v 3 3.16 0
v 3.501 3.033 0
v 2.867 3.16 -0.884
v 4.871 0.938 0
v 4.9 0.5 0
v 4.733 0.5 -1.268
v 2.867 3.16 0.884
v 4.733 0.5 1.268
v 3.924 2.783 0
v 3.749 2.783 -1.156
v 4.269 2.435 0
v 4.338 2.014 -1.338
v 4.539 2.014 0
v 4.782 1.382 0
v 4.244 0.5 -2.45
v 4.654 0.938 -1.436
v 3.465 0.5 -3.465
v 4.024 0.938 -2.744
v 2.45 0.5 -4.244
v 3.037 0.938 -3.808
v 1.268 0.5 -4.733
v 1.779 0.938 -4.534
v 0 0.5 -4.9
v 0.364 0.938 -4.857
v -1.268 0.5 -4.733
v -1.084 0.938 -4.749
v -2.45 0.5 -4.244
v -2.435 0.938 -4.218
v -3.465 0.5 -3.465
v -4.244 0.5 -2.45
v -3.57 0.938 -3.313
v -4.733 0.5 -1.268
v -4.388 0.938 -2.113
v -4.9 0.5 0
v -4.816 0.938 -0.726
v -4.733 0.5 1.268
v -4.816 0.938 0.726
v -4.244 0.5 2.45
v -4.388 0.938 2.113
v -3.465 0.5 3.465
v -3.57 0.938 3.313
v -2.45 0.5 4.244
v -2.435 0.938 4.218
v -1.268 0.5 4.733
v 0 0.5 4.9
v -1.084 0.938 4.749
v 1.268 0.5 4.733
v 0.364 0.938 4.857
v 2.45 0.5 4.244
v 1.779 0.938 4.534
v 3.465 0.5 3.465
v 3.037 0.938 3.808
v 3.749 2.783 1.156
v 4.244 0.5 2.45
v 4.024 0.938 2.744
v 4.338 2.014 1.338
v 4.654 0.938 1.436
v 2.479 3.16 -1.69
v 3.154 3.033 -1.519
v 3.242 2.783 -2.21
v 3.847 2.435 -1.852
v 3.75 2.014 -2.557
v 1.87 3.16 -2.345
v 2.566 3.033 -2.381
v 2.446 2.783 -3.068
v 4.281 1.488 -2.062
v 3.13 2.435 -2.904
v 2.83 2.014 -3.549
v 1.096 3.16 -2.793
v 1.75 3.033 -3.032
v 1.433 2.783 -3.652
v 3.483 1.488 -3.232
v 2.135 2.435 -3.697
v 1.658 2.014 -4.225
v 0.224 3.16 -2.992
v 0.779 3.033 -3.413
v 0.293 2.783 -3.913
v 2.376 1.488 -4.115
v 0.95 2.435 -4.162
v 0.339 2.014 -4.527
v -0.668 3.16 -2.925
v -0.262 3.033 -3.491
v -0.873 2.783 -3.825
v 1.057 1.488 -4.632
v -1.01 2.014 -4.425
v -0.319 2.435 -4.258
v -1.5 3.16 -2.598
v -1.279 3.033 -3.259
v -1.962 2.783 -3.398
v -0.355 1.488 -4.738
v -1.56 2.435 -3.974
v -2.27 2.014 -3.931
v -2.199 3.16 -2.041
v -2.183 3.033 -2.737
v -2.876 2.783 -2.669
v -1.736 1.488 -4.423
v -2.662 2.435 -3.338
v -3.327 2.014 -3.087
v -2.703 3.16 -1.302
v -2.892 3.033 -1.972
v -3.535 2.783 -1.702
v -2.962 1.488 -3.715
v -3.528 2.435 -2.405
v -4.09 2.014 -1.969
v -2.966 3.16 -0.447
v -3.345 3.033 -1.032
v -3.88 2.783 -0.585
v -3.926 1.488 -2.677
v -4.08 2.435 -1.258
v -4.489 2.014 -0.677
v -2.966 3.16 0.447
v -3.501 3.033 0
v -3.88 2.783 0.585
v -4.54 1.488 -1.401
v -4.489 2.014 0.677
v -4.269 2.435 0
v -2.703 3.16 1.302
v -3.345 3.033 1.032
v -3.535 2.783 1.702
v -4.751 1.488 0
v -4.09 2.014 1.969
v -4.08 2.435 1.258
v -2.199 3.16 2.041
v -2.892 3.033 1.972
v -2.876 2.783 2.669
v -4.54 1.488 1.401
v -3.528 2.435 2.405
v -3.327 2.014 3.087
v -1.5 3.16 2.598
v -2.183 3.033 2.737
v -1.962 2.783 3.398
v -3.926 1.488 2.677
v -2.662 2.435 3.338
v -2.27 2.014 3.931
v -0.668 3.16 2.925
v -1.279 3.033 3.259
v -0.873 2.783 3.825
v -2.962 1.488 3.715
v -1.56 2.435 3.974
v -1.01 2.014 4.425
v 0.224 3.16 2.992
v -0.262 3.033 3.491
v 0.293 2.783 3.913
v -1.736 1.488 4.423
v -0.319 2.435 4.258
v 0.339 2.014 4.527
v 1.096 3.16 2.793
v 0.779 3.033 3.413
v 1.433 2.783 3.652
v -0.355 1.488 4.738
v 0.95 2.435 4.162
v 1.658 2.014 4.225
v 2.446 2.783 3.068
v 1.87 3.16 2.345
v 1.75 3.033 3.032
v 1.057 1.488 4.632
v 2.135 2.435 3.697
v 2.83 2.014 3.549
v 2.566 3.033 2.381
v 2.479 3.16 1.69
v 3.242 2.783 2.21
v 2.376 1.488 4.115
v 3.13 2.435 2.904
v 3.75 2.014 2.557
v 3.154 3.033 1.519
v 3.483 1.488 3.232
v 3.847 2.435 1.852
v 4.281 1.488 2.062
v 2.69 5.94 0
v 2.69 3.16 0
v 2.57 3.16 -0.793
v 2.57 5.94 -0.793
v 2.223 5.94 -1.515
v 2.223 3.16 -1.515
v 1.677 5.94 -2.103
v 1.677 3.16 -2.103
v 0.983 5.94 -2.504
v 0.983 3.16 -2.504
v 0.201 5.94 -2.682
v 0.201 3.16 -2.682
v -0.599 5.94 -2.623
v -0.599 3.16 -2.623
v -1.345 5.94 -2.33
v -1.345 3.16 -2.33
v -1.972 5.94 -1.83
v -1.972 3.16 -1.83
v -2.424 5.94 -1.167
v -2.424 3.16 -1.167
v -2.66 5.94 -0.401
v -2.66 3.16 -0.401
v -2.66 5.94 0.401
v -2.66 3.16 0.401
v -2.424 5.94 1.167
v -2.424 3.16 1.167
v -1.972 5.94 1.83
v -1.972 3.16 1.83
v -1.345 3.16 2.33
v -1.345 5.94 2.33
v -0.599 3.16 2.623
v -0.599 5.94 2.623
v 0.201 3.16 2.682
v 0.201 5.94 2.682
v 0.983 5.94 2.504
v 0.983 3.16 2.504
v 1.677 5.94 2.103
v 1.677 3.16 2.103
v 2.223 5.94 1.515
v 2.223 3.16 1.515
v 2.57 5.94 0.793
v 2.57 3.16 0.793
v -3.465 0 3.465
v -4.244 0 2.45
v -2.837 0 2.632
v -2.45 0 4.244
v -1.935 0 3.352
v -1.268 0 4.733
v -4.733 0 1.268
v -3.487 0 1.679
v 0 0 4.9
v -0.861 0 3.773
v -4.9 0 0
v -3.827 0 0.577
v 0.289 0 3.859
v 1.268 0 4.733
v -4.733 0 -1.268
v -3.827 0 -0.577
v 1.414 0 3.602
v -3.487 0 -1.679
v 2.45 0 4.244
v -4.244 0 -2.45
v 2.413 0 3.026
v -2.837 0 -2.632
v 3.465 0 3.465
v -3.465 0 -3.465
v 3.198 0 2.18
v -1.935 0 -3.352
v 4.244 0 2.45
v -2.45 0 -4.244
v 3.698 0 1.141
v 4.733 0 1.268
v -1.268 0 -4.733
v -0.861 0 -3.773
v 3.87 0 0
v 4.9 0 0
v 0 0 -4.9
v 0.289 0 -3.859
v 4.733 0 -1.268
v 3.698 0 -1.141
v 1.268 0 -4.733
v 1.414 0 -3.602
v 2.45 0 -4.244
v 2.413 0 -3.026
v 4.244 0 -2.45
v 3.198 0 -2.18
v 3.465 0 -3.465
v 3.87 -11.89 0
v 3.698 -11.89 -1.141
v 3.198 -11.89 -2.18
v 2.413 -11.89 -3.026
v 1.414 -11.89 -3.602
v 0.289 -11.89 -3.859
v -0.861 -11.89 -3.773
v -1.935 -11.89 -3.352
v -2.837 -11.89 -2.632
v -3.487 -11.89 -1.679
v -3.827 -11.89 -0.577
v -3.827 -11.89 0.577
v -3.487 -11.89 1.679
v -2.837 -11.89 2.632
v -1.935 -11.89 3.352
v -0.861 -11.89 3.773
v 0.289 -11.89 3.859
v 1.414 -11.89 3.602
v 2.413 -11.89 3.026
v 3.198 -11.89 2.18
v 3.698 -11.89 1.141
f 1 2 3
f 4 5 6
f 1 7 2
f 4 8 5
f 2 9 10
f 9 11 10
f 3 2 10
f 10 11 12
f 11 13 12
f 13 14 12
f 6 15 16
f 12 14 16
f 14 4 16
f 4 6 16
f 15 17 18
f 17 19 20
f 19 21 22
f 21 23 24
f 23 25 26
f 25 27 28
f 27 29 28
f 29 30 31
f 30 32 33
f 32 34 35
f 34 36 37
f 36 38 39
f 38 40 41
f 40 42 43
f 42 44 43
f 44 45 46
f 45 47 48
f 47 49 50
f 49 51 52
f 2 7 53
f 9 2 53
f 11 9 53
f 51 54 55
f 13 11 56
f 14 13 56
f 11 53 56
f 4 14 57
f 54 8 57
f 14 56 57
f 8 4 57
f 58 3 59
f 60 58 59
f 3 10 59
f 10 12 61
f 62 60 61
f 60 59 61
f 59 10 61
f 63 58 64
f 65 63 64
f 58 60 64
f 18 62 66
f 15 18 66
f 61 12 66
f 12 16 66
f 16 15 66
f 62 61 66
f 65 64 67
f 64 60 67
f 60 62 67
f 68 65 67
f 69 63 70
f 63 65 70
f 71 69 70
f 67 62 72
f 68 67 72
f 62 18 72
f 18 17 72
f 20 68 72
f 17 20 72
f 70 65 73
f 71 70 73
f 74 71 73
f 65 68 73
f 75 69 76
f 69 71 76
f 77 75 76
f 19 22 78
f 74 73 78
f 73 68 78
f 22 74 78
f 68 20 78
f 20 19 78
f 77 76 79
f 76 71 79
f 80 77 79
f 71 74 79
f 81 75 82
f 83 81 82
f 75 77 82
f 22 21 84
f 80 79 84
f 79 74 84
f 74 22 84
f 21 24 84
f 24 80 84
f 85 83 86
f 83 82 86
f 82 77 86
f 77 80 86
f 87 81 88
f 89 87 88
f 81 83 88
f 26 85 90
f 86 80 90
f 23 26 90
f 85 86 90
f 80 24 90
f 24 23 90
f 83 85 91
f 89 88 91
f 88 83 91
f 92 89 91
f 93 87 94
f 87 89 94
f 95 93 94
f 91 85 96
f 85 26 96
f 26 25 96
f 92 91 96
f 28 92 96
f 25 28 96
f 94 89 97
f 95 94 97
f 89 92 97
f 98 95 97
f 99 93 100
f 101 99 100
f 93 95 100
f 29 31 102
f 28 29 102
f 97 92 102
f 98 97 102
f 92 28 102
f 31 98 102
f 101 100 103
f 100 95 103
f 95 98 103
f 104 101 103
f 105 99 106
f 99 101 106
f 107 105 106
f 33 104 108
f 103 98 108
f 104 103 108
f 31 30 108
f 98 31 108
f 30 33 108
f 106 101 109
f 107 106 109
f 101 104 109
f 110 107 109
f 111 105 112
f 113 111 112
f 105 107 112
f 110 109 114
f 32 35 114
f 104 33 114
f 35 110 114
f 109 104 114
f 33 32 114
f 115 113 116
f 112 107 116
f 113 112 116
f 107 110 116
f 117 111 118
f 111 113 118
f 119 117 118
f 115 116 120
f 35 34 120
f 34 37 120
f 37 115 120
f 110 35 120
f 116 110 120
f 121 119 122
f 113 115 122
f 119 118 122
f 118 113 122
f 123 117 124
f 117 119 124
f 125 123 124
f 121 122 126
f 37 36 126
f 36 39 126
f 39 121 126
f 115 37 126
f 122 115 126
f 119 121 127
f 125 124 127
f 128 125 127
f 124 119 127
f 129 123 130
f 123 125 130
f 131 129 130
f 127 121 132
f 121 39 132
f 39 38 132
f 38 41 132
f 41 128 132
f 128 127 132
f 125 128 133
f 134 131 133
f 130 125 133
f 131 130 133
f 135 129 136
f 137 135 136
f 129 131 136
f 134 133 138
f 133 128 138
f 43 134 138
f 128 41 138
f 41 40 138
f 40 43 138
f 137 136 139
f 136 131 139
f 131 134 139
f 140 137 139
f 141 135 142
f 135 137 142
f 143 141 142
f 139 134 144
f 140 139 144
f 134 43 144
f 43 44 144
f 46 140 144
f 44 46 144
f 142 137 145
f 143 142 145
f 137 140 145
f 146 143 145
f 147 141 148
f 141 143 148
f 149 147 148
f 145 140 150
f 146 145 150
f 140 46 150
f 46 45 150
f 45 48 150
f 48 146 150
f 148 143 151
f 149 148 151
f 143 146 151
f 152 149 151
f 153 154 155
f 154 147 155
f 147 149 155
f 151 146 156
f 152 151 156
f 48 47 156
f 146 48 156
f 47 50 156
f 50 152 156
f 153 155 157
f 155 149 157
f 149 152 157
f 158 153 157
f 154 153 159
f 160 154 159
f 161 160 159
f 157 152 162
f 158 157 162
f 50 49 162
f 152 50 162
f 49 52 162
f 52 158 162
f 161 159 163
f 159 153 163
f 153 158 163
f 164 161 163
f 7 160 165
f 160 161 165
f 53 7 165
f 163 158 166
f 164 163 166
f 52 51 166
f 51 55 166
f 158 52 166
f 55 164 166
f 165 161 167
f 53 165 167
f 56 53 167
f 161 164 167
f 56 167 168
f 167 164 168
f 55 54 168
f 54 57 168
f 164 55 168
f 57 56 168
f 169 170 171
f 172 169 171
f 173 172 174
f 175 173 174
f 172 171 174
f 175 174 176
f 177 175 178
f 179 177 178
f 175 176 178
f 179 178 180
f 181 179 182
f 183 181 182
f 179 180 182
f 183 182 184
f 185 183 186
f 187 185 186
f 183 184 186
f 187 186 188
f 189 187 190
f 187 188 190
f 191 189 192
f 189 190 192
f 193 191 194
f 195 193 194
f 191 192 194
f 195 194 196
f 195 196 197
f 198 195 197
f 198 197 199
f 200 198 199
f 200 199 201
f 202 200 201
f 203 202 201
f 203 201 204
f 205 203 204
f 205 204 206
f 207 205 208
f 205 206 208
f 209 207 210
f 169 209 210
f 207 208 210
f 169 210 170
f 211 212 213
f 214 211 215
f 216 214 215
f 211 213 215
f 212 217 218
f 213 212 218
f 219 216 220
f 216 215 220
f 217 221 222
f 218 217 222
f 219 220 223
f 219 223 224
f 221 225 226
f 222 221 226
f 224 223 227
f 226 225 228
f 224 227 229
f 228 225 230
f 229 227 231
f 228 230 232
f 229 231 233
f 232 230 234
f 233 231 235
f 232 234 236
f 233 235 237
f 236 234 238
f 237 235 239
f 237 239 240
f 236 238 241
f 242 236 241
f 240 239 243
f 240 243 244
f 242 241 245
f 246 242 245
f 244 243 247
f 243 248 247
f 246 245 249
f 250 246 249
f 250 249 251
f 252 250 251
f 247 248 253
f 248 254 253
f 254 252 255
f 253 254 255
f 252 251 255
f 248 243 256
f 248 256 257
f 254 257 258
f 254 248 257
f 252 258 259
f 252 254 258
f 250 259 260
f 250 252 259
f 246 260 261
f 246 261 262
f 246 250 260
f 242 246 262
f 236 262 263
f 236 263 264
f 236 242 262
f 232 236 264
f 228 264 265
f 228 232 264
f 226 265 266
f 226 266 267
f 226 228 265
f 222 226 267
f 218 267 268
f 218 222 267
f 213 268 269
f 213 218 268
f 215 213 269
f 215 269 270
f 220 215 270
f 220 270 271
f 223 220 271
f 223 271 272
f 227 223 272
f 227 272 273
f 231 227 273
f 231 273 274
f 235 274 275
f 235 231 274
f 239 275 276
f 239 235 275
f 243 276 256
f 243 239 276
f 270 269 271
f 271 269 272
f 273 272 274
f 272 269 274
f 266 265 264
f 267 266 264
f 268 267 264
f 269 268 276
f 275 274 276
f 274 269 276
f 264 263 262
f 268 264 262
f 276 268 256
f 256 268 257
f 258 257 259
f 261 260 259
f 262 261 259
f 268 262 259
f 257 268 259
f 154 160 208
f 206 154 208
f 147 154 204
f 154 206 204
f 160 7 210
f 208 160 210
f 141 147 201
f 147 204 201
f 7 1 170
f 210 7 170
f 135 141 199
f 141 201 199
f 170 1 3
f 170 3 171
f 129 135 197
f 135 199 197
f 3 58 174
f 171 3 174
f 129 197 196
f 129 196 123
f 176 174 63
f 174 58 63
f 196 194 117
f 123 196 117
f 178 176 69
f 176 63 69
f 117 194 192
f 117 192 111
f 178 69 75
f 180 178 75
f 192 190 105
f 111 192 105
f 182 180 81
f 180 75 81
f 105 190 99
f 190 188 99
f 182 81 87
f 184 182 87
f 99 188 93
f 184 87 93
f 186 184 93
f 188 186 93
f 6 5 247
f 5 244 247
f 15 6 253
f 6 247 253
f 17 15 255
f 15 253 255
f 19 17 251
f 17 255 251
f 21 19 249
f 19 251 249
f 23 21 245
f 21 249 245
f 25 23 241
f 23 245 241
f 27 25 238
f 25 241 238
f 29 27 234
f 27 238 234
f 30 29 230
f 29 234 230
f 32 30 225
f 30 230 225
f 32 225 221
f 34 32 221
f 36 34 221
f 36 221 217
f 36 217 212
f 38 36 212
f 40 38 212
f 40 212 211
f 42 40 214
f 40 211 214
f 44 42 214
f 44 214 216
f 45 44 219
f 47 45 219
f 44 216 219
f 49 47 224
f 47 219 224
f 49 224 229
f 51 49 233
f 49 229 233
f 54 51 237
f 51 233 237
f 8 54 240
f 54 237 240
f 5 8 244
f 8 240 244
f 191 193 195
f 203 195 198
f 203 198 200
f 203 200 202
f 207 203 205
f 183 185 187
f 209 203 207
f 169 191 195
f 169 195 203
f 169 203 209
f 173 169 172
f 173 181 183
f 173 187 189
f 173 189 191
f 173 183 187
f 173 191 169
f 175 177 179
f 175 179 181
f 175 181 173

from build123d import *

# Parameters (mm, degrees)
SKETCH1_R           = 3.87
BOSS_EXTRUDE1_DEPTH = 11.89
SKETCH4_R           = 2.69
BOSS_EXTRUDE2_DEPTH = 2.78


with BuildPart() as part:
    # Sketch1 → Boss-Extrude1 (new body)
    with BuildSketch(Plane(origin=(0, 0, 0), x_dir=(1, 0, 0), z_dir=(0, 1, 0))):
        Circle(SKETCH1_R)
    extrude(amount=-BOSS_EXTRUDE1_DEPTH)

    # Sketch3 → Revolve1 (revolve)
    with BuildSketch(Plane.XY):
        with BuildLine():
            Line((0, 0), (0, 3.16))
            Line((0, 3.16), (3, 3.16))
            add(Edge.make_bspline(
                [(3, 3.16), (4.283639475, 3.024024765), (4.900890598, 1.632016655), (4.9, 0.5)],
                knots=[0, 0, 0, 0, 1, 1, 1, 1], degree=3))
            Line((4.9, 0.5), (4.9, 0))
            Line((4.9, 0), (0, 0))
        make_face()
    revolve(axis=Axis((0, 0, 0), (0, 1, 0)))

    # Sketch4 → Boss-Extrude2 (add)
    with BuildSketch(Plane(origin=(0, 3.16, 0), x_dir=(1, 0, 0), z_dir=(0, 1, 0))):
        Circle(SKETCH4_R)
    extrude(amount=BOSS_EXTRUDE2_DEPTH)


solid = part.part
